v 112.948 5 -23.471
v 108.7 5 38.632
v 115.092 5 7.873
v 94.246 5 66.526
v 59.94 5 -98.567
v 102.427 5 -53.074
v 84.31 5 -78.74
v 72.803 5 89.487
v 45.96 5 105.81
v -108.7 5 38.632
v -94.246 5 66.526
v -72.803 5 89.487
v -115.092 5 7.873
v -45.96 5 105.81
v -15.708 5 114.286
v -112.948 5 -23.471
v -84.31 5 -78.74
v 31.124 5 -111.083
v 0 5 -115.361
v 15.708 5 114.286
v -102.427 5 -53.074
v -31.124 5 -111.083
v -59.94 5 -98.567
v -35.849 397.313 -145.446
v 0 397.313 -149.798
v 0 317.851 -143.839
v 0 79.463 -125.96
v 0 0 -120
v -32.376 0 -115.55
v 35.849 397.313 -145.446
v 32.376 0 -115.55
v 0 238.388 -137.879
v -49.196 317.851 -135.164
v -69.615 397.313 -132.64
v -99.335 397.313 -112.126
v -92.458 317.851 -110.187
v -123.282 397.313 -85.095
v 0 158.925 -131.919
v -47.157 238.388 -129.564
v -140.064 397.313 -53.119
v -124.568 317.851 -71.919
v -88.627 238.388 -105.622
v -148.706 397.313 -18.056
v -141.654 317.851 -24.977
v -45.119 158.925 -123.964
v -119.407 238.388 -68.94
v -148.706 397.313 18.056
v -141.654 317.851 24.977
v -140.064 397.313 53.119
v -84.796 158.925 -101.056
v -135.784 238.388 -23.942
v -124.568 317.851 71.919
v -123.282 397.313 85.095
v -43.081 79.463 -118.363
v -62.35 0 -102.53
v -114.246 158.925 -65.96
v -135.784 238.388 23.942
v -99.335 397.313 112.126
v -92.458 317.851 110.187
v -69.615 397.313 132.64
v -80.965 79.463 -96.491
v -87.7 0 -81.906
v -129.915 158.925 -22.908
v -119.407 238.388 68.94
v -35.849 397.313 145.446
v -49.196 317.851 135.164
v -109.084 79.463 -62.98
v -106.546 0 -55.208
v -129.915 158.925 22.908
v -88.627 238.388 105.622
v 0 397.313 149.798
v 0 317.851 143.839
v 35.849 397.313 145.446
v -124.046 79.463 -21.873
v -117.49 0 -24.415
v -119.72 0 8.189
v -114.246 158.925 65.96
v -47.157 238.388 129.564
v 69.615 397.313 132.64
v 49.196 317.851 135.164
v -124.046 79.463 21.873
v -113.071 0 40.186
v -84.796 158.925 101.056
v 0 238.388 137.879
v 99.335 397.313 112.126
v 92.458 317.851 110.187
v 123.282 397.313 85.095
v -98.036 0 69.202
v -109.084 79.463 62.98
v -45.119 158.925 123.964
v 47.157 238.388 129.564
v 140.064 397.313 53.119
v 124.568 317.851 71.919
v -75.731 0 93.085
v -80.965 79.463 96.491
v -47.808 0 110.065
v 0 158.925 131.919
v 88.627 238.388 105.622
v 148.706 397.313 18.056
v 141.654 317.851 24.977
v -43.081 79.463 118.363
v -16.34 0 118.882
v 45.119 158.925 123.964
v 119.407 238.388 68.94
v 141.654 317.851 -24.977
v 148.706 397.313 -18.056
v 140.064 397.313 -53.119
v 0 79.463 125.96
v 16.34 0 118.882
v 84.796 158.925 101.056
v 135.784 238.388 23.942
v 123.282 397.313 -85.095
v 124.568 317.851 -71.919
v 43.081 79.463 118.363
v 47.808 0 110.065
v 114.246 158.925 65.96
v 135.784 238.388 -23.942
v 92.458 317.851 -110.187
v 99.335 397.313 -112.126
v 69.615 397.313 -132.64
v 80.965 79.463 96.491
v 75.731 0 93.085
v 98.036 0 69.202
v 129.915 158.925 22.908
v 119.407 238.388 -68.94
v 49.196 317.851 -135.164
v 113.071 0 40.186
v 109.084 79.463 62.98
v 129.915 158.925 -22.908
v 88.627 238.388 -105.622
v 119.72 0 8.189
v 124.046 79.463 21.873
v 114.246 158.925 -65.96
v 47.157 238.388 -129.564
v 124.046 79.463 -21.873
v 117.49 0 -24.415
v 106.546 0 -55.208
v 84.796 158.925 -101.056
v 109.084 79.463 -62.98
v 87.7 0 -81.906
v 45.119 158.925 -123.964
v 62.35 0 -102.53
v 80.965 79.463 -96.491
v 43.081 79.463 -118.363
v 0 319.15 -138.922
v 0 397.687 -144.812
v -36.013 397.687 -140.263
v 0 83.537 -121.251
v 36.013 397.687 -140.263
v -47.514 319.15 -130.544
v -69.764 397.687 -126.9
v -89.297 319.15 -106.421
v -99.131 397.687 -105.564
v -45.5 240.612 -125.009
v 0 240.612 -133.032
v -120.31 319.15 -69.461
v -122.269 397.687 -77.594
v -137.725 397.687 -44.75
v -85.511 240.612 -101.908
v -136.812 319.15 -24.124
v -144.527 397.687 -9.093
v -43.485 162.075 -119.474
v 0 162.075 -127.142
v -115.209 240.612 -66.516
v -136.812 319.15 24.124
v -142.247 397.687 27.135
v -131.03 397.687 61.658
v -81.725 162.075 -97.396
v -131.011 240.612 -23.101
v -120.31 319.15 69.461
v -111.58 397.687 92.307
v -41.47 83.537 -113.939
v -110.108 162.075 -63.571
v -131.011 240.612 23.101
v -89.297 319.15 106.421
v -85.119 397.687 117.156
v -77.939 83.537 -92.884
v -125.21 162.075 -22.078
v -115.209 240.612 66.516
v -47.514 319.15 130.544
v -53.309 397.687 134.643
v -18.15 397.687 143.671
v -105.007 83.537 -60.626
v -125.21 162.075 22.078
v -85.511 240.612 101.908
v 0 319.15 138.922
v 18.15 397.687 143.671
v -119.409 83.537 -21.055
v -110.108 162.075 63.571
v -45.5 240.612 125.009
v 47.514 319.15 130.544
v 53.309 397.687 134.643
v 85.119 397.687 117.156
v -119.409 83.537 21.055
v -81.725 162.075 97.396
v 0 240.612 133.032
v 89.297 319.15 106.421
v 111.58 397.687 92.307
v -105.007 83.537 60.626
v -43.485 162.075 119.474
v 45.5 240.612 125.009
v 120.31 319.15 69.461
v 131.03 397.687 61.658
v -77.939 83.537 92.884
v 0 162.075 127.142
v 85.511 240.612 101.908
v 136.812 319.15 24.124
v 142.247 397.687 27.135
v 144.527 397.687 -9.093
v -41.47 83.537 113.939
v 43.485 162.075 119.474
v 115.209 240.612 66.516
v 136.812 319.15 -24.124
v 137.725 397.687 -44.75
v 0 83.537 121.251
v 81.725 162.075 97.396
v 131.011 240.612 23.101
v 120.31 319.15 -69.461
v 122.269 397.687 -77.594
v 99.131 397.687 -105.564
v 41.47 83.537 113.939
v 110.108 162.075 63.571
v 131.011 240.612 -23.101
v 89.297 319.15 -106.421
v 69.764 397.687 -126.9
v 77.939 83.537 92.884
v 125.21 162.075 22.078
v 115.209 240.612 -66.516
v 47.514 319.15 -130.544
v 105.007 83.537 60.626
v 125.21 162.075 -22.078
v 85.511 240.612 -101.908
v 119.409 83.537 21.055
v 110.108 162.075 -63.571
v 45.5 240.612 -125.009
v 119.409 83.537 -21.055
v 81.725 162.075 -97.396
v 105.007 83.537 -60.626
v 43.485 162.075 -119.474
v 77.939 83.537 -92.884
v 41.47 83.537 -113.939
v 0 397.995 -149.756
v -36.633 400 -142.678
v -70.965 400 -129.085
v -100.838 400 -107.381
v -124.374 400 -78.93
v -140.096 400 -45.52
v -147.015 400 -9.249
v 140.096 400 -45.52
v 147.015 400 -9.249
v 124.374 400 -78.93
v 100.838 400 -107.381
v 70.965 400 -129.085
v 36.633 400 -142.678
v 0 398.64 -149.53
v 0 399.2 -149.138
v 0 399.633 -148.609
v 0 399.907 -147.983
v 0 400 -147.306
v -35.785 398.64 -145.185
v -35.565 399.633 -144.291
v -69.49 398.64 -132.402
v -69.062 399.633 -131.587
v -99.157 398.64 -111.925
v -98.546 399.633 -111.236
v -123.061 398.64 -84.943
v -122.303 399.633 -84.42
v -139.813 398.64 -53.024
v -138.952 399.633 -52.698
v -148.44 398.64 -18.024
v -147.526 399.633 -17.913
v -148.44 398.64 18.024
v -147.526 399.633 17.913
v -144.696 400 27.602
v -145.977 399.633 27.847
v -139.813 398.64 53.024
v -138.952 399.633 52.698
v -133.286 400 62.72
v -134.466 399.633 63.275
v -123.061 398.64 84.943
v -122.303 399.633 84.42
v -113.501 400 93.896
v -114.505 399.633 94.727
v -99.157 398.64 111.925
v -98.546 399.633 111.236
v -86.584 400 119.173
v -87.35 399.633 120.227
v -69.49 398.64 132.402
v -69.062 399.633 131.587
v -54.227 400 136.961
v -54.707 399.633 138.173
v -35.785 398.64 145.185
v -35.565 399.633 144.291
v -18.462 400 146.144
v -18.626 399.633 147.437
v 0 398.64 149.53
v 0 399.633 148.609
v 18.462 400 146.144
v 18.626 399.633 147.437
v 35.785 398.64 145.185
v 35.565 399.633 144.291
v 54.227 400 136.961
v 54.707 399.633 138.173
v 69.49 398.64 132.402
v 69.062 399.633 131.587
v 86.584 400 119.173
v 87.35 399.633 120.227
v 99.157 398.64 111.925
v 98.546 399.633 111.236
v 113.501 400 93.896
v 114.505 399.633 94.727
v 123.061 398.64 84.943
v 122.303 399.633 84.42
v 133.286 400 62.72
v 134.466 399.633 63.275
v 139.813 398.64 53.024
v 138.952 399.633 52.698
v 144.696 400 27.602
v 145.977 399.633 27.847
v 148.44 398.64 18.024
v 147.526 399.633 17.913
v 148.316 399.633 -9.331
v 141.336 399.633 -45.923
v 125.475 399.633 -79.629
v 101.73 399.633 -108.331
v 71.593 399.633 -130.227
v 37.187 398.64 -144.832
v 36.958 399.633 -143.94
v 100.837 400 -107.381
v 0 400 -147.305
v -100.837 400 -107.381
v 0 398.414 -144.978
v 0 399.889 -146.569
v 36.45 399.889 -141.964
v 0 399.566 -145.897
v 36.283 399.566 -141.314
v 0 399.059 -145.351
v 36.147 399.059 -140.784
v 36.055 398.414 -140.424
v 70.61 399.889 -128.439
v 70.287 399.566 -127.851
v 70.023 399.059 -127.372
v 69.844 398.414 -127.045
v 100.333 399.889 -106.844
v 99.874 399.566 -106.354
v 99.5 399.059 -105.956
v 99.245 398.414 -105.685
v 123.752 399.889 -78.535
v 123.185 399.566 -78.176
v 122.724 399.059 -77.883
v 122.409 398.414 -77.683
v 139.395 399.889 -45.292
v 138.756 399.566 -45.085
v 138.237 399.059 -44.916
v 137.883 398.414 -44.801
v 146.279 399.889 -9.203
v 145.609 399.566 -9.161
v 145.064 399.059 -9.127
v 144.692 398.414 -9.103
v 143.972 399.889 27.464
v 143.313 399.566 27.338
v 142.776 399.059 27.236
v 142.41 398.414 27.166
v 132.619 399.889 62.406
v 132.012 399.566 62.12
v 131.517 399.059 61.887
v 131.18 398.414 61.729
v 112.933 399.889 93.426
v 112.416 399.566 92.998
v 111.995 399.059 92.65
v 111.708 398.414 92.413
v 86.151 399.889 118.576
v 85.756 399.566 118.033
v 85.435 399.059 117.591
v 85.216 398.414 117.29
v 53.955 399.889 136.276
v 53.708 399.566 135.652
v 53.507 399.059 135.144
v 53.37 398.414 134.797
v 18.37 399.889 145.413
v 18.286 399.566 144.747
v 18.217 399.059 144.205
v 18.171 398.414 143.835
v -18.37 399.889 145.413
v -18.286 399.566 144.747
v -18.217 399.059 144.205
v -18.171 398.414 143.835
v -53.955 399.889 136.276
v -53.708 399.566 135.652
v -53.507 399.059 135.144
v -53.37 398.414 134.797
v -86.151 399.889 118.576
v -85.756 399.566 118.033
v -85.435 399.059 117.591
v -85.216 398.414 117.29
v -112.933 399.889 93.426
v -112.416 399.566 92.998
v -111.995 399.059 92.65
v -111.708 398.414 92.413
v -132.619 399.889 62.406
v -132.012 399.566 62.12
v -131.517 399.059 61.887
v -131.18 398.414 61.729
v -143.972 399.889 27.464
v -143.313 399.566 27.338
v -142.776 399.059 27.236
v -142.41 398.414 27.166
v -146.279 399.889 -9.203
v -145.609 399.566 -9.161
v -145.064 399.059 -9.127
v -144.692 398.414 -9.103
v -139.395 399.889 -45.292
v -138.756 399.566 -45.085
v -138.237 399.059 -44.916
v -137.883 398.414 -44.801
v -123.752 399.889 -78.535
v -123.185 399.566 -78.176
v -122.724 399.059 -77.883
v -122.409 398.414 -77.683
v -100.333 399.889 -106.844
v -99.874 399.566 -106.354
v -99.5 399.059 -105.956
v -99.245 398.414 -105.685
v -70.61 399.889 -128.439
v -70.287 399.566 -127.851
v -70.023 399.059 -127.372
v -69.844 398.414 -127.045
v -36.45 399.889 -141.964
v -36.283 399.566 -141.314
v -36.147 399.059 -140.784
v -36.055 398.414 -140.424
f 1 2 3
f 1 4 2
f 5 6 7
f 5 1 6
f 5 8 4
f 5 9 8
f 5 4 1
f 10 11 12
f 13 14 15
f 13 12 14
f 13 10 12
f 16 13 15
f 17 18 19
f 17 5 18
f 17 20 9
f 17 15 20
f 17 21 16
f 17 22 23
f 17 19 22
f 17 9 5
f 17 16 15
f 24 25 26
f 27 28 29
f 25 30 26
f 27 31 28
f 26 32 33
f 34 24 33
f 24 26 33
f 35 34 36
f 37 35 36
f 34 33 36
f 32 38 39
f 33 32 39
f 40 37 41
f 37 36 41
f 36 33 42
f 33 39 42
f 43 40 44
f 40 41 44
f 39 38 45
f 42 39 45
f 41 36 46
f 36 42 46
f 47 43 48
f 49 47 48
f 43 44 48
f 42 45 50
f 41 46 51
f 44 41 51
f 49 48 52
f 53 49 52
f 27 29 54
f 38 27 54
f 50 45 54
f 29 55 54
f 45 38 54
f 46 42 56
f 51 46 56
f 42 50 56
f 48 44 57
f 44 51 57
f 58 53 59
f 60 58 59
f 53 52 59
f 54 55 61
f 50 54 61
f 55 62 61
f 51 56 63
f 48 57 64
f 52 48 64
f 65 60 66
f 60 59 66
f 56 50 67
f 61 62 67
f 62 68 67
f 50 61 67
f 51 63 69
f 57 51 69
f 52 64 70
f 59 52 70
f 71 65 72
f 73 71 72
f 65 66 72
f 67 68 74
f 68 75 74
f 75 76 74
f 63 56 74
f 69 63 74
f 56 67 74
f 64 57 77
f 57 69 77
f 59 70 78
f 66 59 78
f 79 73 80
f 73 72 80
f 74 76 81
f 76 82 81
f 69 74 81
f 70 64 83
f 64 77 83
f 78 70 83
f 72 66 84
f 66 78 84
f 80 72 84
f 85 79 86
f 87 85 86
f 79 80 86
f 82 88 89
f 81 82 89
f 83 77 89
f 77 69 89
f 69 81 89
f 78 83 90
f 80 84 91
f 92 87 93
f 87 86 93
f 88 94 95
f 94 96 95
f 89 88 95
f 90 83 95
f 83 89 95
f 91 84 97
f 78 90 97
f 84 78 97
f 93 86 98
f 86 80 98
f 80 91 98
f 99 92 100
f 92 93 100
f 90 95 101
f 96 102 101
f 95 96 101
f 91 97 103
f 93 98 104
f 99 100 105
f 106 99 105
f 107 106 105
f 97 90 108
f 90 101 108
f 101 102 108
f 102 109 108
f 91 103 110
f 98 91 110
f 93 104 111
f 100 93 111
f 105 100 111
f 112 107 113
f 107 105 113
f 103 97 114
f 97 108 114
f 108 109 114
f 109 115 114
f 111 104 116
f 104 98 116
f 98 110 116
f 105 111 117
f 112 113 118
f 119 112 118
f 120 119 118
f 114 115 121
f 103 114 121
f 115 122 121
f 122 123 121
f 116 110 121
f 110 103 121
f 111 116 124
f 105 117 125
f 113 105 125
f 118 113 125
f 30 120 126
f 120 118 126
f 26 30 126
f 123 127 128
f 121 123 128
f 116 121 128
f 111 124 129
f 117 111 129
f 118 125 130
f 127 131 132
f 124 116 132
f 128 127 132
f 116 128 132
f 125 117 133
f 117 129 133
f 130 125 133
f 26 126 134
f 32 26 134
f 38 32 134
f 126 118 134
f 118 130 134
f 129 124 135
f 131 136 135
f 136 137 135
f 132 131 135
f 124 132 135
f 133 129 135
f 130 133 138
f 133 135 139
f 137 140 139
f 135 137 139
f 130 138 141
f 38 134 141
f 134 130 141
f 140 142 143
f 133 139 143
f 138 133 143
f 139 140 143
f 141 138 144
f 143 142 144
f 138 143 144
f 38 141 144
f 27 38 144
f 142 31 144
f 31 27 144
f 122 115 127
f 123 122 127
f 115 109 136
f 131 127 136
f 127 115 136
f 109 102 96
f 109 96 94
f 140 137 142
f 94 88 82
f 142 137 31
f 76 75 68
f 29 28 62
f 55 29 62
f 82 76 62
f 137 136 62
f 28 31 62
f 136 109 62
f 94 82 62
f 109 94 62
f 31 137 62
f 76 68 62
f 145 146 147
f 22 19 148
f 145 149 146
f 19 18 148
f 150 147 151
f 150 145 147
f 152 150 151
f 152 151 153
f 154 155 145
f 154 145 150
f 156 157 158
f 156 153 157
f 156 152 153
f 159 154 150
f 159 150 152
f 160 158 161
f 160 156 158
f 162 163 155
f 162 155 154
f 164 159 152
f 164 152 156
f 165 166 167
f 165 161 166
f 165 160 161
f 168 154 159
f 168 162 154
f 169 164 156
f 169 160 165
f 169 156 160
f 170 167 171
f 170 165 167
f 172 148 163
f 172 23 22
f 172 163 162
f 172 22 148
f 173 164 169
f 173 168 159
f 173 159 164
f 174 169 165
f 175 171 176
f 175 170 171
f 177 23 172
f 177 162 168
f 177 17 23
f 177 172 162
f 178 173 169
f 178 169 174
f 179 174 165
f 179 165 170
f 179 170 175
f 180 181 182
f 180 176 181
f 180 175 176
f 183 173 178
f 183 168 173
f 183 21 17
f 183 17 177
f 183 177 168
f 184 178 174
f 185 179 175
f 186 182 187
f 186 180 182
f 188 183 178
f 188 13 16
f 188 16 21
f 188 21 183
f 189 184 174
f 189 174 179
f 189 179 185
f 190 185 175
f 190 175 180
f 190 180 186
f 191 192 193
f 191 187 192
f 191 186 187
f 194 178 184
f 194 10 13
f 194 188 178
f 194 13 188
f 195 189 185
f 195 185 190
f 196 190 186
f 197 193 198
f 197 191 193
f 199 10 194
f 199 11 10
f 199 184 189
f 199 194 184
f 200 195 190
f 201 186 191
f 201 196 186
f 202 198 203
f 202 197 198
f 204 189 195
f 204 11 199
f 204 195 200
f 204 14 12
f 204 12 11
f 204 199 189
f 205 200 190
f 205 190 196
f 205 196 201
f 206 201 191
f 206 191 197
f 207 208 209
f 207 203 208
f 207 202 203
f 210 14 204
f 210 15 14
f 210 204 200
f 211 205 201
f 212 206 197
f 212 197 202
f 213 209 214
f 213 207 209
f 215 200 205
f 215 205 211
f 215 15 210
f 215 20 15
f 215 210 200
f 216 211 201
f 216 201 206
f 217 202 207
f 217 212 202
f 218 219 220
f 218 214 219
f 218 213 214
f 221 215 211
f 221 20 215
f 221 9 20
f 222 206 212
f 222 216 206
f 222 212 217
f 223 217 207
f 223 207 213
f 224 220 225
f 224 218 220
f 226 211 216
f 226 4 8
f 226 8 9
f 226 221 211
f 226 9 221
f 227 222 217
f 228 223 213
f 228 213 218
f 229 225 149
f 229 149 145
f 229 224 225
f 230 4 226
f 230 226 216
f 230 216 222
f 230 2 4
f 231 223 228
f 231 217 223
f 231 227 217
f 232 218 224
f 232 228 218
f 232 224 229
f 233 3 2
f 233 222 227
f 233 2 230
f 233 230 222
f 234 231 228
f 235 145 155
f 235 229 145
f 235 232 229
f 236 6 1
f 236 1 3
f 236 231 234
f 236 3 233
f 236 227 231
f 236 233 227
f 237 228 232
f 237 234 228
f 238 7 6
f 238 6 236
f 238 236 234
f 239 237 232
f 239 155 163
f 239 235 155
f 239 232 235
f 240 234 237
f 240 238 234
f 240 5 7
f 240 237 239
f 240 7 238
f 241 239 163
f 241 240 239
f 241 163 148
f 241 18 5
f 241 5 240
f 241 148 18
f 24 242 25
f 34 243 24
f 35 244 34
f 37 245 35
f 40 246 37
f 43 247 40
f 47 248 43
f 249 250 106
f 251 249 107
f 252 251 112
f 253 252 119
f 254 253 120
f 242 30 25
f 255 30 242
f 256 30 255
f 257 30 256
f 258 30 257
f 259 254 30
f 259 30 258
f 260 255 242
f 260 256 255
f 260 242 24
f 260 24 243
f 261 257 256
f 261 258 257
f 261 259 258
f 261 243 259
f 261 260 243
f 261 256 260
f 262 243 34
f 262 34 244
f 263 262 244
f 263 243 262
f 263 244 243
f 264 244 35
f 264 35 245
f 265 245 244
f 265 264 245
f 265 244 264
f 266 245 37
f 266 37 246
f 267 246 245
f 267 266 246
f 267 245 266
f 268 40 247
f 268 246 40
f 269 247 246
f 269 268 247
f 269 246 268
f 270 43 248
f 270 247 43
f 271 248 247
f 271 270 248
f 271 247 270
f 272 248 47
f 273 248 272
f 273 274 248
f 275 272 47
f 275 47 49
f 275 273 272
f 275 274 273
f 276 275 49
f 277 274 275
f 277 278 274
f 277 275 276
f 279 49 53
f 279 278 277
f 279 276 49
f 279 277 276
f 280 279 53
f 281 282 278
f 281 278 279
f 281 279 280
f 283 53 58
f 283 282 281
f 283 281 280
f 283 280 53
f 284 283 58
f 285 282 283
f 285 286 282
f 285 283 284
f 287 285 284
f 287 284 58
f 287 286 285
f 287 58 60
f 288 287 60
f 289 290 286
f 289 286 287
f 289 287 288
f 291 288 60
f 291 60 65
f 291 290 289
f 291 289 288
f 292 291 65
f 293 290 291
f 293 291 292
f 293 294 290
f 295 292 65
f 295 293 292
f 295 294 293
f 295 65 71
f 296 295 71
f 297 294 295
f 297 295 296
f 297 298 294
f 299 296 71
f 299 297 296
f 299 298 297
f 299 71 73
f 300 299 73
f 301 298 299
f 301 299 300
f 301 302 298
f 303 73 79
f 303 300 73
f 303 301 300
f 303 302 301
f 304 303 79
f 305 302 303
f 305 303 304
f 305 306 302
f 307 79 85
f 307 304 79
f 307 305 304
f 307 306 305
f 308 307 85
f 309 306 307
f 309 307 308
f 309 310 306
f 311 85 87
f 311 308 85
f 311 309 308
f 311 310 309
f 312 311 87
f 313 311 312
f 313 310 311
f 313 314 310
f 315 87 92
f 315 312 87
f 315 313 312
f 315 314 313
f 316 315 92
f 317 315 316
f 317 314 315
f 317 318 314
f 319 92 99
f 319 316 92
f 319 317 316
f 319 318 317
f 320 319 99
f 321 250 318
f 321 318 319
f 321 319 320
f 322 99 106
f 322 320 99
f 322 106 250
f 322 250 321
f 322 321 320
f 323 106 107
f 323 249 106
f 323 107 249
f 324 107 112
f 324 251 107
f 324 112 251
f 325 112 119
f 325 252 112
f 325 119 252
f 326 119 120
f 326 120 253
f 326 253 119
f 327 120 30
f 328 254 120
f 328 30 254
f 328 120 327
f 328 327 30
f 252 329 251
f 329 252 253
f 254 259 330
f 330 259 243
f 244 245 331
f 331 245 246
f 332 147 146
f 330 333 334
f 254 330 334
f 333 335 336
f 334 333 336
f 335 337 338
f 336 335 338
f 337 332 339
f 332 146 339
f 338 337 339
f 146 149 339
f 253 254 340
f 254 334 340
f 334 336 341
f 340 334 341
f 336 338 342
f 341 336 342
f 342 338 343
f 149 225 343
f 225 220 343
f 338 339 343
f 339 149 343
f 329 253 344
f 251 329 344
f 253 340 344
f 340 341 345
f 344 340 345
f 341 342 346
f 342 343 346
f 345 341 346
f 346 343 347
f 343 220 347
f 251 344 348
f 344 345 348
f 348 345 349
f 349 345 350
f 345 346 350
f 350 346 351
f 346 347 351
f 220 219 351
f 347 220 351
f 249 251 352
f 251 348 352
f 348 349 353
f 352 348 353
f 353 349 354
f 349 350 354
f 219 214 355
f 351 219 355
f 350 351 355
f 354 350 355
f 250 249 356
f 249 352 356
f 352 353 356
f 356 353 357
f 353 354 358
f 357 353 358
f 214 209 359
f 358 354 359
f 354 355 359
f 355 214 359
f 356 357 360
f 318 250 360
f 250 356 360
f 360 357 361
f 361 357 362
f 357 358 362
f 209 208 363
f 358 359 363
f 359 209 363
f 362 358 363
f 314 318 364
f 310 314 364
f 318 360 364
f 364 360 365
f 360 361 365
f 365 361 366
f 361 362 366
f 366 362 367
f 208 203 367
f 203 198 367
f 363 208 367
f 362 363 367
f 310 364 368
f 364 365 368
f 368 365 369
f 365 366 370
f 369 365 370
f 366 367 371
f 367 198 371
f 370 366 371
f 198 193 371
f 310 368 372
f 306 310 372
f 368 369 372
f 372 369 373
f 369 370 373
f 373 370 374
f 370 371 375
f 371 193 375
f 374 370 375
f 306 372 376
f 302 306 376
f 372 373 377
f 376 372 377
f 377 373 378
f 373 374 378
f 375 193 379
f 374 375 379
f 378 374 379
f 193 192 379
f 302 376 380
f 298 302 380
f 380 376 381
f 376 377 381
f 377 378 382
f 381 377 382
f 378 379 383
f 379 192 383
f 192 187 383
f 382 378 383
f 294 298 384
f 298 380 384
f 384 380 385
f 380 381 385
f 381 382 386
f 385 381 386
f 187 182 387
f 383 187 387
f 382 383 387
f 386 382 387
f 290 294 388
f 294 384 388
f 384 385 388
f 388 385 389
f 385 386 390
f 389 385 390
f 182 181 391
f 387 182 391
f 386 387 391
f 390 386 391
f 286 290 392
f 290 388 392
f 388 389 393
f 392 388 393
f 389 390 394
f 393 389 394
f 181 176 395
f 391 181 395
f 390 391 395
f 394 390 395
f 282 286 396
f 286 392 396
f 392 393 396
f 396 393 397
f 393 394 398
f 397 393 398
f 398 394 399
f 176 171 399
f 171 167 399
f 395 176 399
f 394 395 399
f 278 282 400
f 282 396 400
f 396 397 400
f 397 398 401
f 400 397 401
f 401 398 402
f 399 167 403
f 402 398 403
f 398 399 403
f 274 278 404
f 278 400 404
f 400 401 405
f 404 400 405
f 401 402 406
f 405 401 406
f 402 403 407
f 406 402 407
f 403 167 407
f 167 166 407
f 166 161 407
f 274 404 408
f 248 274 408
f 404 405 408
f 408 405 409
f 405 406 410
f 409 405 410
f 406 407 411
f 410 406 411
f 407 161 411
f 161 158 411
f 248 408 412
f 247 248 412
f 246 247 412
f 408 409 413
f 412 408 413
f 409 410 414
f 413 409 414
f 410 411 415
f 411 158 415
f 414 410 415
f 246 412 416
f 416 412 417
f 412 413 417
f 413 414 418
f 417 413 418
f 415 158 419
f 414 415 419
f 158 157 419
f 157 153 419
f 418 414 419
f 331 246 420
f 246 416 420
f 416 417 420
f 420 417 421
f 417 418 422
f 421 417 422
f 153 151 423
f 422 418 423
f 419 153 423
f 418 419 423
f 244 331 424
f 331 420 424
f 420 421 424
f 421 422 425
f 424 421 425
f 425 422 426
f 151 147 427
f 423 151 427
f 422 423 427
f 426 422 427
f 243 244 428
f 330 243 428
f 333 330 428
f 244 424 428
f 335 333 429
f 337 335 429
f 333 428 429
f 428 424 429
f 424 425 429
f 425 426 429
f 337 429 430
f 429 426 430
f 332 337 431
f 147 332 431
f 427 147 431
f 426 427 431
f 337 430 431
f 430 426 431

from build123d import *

# Parameters (mm, degrees)
VACIADO1_T  = -5
REDONDEO2_R = 2.5


with BuildPart() as part:
    # Croquis1 → Revolución1 (revolve)
    with BuildSketch(Plane.XY, mode=Mode.PRIVATE) as revoluci_n1_sk:
        Polygon((0, 400), (150, 400), (120, 0), (0, 0), align=None)
    revolve(revoluci_n1_sk.sketch.rotate(Axis((0, 0, 0), (0, 1, 0)), 90), axis=Axis((0, 0, 0), (0, 1, 0)))

    # Vaciado1
    vaciado1_openings = [part.faces().sort_by_distance(p)[0] for p in [
        (0, 400, 0),
    ]]
    offset(amount=VACIADO1_T, openings=vaciado1_openings, kind=Kind.INTERSECTION)

    # Redondeo2
    redondeo2_edges = [part.edges().sort_by_distance(p)[0] for p in [
        (0, 400, 150),
        (0, 400, 144.98595722),
    ]]
    fillet(redondeo2_edges, radius=REDONDEO2_R - 0.0001)  # a hair under: the kernel refuses the full size


solid = part.part
